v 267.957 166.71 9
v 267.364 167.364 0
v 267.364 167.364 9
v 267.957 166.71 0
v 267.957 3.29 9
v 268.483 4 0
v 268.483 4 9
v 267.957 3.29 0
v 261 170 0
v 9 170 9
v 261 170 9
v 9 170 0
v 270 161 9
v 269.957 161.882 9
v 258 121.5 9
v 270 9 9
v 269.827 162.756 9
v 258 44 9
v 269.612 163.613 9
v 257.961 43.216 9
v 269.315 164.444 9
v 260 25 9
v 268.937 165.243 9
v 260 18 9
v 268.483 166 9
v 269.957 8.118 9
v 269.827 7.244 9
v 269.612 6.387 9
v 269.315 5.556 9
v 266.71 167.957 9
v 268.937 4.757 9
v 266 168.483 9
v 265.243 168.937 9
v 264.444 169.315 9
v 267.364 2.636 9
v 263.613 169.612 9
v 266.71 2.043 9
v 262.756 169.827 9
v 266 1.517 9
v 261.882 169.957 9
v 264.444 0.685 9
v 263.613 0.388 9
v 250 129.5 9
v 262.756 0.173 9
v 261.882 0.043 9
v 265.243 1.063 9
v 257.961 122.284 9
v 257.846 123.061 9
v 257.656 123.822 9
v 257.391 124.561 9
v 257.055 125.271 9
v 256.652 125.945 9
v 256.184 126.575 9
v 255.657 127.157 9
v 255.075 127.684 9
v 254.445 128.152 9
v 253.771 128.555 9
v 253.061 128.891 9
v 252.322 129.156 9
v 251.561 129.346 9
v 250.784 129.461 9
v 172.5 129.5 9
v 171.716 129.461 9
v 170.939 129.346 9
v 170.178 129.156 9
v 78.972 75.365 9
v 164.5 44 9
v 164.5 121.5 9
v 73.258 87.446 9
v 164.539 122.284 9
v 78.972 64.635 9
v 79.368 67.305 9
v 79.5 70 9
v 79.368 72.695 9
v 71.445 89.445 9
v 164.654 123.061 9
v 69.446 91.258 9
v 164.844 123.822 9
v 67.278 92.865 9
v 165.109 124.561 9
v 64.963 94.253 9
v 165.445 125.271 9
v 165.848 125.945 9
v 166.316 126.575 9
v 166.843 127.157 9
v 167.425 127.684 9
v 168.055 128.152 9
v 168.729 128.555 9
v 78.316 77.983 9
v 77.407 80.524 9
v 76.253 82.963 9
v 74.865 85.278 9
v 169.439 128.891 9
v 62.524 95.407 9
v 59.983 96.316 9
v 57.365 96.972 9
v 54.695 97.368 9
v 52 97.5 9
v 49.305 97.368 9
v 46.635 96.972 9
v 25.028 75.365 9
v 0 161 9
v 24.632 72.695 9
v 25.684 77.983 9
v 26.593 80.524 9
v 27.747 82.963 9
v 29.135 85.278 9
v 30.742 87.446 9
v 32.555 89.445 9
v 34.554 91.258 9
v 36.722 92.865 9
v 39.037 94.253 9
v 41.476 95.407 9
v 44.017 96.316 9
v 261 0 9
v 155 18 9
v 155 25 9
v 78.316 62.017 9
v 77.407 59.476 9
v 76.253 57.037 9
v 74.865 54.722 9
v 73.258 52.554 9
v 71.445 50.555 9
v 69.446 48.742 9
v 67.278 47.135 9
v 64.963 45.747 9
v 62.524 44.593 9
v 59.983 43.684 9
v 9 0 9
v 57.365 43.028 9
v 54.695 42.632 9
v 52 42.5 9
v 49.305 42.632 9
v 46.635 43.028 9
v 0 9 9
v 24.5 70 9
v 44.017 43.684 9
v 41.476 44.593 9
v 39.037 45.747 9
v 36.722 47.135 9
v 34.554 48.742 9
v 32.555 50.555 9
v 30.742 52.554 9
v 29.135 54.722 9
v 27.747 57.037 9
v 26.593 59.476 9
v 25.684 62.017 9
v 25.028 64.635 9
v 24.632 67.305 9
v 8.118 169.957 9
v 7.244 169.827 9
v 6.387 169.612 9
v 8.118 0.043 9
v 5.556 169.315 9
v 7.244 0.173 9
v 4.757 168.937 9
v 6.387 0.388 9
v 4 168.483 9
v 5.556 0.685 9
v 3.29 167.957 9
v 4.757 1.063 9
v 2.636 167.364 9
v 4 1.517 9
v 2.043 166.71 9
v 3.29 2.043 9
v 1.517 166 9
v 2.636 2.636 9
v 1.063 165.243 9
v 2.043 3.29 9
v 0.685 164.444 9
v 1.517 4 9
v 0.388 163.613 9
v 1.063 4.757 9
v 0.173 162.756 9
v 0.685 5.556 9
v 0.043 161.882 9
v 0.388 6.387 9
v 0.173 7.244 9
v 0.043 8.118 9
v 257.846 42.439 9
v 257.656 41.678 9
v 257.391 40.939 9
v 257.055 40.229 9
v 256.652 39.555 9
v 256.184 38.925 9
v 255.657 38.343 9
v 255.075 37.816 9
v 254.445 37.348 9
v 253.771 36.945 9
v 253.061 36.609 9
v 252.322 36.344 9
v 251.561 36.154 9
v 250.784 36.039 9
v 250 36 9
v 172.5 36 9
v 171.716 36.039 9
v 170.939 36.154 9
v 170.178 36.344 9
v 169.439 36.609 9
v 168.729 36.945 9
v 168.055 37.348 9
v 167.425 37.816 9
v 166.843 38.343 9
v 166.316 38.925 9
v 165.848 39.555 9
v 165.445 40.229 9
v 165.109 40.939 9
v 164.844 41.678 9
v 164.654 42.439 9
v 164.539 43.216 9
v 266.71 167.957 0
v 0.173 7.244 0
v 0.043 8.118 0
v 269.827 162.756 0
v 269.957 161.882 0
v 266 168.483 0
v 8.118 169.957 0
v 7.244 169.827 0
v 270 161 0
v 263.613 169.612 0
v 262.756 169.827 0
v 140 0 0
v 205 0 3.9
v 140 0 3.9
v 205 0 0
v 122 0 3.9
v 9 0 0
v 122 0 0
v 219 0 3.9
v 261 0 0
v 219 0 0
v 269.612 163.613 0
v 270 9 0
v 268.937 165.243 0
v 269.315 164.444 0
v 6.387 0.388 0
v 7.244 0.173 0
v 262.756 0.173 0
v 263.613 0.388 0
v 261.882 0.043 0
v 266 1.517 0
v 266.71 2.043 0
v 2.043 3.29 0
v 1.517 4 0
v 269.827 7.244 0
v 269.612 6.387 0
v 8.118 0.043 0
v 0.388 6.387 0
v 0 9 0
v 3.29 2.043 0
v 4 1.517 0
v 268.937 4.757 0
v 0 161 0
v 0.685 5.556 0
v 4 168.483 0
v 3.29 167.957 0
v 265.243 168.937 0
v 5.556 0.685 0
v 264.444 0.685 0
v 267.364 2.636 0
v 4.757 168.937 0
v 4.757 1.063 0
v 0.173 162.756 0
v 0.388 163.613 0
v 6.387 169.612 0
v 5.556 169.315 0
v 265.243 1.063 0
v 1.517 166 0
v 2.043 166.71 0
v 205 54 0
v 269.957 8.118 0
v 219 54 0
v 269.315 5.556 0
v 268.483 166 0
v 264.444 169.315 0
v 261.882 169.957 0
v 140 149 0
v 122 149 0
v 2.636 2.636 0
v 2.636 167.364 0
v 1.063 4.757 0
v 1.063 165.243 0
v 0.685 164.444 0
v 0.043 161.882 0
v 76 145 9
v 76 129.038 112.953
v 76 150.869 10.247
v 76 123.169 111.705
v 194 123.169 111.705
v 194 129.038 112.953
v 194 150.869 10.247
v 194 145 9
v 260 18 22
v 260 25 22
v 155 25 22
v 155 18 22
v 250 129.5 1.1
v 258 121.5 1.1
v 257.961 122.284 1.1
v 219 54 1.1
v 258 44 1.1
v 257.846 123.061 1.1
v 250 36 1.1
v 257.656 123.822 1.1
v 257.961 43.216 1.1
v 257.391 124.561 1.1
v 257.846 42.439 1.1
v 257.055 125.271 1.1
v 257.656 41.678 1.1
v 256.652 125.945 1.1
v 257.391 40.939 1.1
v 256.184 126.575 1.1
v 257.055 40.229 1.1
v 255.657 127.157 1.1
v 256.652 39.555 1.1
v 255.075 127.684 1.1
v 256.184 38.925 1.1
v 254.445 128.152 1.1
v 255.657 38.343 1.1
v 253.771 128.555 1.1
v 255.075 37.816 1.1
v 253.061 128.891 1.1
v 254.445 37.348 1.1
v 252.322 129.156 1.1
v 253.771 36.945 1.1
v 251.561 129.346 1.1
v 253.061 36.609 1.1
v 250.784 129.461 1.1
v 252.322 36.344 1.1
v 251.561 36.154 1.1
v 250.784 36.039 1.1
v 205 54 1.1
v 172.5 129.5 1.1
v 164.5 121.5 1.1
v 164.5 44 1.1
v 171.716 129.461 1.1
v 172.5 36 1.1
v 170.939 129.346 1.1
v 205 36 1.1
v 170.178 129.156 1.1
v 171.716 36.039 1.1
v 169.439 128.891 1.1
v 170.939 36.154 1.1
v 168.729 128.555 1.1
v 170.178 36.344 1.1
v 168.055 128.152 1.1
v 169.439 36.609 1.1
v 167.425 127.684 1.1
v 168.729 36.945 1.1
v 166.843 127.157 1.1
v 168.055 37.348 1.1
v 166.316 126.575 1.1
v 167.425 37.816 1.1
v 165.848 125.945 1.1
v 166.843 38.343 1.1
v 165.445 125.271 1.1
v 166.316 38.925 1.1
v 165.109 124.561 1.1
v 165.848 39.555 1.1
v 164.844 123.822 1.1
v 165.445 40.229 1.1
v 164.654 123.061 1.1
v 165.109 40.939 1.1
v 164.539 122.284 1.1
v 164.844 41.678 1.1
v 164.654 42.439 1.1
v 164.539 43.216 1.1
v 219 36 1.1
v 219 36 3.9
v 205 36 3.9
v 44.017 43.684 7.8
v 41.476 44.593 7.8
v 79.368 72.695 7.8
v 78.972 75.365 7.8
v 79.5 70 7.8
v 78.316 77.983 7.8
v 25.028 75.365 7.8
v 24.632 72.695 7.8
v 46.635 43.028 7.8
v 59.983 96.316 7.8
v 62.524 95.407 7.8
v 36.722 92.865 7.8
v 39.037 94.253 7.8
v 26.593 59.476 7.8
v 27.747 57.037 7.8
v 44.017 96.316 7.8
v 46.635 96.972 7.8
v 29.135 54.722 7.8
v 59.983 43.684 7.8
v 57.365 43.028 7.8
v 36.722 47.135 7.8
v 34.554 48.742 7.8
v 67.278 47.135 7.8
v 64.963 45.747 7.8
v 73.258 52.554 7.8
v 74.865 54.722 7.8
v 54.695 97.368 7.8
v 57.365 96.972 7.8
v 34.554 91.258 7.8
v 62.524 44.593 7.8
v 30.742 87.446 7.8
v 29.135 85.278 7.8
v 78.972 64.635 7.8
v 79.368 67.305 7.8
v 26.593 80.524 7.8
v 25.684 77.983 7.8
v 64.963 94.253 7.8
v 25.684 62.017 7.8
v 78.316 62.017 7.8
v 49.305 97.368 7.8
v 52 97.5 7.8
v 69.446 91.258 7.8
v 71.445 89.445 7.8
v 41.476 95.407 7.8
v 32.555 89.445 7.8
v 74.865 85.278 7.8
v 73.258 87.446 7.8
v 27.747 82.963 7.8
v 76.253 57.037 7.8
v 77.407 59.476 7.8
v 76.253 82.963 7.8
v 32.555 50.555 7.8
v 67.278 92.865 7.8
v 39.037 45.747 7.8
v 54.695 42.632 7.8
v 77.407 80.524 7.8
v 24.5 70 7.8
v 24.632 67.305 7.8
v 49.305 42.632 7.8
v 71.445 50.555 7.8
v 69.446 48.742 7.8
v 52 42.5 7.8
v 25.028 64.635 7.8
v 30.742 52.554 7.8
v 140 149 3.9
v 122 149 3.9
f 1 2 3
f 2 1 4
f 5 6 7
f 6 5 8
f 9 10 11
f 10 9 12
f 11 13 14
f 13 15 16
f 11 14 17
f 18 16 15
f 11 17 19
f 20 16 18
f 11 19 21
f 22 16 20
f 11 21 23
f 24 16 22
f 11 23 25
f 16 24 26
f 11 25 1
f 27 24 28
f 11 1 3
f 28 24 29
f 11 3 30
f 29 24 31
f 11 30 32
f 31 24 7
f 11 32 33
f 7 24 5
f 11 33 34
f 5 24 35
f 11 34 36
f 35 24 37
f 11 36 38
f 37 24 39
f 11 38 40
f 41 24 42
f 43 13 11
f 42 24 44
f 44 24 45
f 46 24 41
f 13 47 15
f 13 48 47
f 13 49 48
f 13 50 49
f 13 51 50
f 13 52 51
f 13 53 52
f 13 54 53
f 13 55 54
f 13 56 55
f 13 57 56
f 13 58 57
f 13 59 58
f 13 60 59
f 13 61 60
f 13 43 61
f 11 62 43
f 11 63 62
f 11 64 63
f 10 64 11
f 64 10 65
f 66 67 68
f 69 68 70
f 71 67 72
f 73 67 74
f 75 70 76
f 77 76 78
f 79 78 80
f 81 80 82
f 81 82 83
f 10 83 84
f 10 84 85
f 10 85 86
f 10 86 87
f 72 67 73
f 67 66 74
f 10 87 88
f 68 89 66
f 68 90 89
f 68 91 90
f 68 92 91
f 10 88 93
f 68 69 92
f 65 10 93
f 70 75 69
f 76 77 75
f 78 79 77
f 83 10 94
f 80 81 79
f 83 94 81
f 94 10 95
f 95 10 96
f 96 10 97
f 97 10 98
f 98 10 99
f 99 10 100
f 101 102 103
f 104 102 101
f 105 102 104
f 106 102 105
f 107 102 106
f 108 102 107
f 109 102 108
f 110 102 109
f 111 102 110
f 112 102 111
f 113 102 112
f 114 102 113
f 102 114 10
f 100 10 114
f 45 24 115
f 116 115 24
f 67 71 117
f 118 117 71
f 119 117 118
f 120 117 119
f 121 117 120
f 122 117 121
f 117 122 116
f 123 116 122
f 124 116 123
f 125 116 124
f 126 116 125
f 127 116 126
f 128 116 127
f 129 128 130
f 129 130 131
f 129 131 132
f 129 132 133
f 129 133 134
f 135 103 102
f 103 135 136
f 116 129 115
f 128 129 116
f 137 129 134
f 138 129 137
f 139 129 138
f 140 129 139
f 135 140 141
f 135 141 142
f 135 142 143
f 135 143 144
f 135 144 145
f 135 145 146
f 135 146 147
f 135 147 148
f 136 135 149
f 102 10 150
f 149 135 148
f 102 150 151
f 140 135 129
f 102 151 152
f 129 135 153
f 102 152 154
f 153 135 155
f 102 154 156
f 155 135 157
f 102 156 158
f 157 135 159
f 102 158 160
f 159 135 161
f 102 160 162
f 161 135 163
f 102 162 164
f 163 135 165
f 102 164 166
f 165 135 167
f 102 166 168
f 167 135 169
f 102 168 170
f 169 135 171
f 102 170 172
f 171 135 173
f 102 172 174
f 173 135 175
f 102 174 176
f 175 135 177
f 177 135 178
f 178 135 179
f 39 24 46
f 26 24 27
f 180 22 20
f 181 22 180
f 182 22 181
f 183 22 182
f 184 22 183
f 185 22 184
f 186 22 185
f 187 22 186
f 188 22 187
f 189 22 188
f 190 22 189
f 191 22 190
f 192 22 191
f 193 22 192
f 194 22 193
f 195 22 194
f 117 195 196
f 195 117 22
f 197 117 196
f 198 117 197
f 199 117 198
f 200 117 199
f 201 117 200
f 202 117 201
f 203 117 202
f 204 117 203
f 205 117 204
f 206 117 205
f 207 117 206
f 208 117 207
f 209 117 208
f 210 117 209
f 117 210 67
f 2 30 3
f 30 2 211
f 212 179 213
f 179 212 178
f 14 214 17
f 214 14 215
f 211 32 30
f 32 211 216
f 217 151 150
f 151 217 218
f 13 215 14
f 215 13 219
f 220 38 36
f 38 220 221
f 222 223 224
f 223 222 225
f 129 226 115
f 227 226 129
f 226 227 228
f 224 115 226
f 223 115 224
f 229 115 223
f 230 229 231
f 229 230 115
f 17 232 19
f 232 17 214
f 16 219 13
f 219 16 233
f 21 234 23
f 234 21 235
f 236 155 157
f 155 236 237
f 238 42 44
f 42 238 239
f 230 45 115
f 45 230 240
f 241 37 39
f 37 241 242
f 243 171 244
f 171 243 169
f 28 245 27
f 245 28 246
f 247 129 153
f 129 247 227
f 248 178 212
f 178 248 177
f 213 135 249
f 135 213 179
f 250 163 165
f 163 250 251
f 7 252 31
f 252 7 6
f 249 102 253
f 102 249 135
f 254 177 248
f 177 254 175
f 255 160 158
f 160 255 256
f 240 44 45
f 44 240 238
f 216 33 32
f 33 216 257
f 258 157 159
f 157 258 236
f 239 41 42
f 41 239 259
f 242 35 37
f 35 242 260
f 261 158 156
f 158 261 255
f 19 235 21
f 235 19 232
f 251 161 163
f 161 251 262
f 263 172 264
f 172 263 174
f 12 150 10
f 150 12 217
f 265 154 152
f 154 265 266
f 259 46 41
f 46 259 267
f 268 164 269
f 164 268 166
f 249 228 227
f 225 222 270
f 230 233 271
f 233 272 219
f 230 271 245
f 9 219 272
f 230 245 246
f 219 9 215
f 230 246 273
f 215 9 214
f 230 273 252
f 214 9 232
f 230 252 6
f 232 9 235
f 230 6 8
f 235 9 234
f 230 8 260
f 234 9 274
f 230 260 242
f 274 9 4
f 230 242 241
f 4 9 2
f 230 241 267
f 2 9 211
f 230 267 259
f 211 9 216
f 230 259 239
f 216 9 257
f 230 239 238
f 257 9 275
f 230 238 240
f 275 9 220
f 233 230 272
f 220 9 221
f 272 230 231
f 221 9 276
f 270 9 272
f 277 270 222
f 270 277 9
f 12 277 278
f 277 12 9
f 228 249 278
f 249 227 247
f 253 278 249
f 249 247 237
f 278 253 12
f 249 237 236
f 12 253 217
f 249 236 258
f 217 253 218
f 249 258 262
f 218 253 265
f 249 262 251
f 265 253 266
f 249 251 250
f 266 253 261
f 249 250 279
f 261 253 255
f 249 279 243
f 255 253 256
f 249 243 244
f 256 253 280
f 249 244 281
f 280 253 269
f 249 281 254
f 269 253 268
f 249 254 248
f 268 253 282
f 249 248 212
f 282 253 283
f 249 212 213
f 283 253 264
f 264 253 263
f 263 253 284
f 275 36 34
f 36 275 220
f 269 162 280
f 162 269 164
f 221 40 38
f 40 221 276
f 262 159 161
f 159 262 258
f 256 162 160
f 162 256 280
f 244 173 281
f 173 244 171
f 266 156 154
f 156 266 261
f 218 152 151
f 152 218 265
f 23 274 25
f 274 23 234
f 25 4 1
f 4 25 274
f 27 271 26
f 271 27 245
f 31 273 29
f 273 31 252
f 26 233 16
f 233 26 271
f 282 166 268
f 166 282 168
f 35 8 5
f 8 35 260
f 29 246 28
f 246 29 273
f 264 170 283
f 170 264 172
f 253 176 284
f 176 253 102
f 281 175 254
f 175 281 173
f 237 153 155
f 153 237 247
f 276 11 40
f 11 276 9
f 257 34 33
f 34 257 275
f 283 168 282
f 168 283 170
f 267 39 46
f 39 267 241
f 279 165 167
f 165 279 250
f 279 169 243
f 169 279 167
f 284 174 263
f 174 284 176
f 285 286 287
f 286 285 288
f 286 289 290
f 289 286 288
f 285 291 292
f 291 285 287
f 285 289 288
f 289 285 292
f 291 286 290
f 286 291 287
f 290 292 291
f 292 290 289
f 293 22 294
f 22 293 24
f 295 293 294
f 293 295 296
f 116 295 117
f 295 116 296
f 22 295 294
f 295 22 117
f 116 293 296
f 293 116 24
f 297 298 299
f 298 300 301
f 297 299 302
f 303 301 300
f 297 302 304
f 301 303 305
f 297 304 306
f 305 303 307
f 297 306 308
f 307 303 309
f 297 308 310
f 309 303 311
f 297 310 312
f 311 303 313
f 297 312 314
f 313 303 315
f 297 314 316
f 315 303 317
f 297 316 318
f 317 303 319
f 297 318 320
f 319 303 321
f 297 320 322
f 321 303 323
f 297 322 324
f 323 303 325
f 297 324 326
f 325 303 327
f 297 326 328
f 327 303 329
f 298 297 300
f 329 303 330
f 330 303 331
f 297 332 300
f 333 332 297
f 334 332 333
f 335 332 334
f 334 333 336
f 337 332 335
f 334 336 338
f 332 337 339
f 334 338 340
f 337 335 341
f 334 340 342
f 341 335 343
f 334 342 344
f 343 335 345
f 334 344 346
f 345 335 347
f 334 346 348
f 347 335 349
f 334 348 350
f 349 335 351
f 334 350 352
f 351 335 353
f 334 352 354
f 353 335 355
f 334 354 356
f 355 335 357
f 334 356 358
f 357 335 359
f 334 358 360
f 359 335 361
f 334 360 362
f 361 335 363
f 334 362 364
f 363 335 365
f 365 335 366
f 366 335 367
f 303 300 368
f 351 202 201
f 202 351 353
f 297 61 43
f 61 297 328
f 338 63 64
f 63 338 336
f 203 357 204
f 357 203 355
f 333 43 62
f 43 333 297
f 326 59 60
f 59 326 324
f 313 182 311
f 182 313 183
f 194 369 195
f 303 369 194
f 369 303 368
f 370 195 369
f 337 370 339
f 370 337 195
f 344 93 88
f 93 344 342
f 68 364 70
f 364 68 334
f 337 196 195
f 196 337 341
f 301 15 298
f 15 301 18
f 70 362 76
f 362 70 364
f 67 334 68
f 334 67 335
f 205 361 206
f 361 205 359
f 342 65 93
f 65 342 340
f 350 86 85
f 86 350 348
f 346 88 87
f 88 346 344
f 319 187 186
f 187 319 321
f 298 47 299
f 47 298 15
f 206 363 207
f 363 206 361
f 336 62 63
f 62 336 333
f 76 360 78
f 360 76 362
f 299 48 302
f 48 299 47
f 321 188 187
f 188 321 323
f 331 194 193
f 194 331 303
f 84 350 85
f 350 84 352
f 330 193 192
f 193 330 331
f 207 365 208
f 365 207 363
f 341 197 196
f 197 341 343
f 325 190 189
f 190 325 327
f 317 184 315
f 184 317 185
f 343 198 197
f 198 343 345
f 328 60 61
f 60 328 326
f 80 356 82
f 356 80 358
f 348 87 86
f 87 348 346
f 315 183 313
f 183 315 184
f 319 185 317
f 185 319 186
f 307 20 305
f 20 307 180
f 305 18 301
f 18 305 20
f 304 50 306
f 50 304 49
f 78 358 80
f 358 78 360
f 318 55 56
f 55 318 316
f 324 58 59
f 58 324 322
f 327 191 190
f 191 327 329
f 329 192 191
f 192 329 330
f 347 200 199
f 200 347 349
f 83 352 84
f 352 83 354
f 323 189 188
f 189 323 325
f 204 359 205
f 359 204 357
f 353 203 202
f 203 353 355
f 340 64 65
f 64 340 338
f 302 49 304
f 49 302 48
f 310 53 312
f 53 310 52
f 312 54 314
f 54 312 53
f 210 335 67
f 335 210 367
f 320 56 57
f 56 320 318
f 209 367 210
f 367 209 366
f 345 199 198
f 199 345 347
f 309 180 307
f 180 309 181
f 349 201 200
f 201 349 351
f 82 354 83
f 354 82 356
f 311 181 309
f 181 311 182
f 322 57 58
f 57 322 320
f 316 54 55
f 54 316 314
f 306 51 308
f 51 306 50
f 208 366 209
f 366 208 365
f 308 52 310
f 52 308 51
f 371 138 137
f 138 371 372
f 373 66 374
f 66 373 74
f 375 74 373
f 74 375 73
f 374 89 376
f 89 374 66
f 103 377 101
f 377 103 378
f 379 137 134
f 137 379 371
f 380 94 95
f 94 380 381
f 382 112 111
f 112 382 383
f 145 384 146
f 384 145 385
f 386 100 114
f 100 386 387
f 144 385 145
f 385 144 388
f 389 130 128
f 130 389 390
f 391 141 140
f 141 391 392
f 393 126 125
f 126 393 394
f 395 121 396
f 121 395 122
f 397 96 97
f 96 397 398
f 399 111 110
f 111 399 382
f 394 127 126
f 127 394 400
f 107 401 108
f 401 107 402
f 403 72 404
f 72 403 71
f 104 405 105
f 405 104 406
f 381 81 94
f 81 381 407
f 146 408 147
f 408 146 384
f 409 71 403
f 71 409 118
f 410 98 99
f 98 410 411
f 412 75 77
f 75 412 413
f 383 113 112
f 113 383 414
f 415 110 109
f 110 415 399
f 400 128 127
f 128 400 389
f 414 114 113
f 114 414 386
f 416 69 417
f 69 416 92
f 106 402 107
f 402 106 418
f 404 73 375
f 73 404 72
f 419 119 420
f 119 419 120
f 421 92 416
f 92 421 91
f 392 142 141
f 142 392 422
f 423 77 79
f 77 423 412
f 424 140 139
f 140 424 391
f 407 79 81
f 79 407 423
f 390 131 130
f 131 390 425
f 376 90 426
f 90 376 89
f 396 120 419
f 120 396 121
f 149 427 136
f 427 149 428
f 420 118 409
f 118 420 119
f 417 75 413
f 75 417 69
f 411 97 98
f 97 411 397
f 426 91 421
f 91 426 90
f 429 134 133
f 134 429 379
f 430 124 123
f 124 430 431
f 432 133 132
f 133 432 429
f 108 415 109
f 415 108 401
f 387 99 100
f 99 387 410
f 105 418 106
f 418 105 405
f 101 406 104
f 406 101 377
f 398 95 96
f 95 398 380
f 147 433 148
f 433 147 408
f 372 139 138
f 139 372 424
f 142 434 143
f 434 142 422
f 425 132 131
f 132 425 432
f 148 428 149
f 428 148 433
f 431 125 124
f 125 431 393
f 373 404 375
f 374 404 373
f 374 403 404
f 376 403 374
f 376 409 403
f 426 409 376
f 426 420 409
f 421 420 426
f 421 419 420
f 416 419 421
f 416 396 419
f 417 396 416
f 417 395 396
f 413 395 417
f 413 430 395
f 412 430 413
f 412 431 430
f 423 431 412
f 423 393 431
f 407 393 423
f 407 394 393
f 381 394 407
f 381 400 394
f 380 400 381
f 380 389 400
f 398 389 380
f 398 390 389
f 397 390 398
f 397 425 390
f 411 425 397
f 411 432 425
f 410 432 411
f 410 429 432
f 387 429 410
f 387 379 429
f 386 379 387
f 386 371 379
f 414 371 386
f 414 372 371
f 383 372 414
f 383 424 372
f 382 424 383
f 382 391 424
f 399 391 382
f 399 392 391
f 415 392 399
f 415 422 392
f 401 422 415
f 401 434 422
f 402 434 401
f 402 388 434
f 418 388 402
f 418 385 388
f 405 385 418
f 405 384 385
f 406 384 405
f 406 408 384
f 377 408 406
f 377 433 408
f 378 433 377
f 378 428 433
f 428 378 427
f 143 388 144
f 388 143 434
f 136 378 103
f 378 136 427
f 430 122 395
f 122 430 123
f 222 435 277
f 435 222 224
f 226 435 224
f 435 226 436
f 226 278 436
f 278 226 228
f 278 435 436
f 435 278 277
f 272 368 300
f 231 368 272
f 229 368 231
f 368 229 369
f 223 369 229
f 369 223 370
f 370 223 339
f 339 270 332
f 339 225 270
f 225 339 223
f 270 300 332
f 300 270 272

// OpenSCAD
// PokéDock V2 concept base — dimensions in mm
// HMI uses rear 75 mm mounting holes.
// Qi tray is sized around Samsung EP-P2400 91x91x18.3, with clearance.
$fn=64;

BASE_W=270;
BASE_D=170;
BASE_H=9;
R=9;

QI_W=93.5;
QI_D=93.5;
QI_DEPTH=8;  // shallow top tray: charger remains removable/ventilated

VESA=75;
PLATE_W=118;
PLATE_H=105;
PLATE_T=6;
PLATE_Y=145;

module rbox(w,d,h,r){
 hull() for(x=[r,w-r]) for(y=[r,d-r]) translate([x,y,0]) cylinder(h=h,r=r);
}

difference(){
 union(){
   rbox(BASE_W,BASE_D,BASE_H,R);
   // HMI support plate
   translate([(BASE_W-PLATE_W)/2,PLATE_Y,BASE_H])
     rotate([12,0,0]) cube([PLATE_W,PLATE_T,PLATE_H]);
   // phone front stop around Qi tray
   translate([BASE_W-115,18,BASE_H]) cube([105,7,13]);
 }
 // removable Qi tray
 translate([BASE_W-QI_W-12,36,BASE_H-QI_DEPTH+0.1]) rbox(QI_W,QI_D,QI_DEPTH,8);
 // NFC marker/recess
 translate([52,70,BASE_H-1.2]) cylinder(h=2,d=55);
 // cable channels
 translate([122,-1,-0.1]) cube([18,150,4]);
 translate([BASE_W-65,-1,-0.1]) cube([14,55,4]);
}
